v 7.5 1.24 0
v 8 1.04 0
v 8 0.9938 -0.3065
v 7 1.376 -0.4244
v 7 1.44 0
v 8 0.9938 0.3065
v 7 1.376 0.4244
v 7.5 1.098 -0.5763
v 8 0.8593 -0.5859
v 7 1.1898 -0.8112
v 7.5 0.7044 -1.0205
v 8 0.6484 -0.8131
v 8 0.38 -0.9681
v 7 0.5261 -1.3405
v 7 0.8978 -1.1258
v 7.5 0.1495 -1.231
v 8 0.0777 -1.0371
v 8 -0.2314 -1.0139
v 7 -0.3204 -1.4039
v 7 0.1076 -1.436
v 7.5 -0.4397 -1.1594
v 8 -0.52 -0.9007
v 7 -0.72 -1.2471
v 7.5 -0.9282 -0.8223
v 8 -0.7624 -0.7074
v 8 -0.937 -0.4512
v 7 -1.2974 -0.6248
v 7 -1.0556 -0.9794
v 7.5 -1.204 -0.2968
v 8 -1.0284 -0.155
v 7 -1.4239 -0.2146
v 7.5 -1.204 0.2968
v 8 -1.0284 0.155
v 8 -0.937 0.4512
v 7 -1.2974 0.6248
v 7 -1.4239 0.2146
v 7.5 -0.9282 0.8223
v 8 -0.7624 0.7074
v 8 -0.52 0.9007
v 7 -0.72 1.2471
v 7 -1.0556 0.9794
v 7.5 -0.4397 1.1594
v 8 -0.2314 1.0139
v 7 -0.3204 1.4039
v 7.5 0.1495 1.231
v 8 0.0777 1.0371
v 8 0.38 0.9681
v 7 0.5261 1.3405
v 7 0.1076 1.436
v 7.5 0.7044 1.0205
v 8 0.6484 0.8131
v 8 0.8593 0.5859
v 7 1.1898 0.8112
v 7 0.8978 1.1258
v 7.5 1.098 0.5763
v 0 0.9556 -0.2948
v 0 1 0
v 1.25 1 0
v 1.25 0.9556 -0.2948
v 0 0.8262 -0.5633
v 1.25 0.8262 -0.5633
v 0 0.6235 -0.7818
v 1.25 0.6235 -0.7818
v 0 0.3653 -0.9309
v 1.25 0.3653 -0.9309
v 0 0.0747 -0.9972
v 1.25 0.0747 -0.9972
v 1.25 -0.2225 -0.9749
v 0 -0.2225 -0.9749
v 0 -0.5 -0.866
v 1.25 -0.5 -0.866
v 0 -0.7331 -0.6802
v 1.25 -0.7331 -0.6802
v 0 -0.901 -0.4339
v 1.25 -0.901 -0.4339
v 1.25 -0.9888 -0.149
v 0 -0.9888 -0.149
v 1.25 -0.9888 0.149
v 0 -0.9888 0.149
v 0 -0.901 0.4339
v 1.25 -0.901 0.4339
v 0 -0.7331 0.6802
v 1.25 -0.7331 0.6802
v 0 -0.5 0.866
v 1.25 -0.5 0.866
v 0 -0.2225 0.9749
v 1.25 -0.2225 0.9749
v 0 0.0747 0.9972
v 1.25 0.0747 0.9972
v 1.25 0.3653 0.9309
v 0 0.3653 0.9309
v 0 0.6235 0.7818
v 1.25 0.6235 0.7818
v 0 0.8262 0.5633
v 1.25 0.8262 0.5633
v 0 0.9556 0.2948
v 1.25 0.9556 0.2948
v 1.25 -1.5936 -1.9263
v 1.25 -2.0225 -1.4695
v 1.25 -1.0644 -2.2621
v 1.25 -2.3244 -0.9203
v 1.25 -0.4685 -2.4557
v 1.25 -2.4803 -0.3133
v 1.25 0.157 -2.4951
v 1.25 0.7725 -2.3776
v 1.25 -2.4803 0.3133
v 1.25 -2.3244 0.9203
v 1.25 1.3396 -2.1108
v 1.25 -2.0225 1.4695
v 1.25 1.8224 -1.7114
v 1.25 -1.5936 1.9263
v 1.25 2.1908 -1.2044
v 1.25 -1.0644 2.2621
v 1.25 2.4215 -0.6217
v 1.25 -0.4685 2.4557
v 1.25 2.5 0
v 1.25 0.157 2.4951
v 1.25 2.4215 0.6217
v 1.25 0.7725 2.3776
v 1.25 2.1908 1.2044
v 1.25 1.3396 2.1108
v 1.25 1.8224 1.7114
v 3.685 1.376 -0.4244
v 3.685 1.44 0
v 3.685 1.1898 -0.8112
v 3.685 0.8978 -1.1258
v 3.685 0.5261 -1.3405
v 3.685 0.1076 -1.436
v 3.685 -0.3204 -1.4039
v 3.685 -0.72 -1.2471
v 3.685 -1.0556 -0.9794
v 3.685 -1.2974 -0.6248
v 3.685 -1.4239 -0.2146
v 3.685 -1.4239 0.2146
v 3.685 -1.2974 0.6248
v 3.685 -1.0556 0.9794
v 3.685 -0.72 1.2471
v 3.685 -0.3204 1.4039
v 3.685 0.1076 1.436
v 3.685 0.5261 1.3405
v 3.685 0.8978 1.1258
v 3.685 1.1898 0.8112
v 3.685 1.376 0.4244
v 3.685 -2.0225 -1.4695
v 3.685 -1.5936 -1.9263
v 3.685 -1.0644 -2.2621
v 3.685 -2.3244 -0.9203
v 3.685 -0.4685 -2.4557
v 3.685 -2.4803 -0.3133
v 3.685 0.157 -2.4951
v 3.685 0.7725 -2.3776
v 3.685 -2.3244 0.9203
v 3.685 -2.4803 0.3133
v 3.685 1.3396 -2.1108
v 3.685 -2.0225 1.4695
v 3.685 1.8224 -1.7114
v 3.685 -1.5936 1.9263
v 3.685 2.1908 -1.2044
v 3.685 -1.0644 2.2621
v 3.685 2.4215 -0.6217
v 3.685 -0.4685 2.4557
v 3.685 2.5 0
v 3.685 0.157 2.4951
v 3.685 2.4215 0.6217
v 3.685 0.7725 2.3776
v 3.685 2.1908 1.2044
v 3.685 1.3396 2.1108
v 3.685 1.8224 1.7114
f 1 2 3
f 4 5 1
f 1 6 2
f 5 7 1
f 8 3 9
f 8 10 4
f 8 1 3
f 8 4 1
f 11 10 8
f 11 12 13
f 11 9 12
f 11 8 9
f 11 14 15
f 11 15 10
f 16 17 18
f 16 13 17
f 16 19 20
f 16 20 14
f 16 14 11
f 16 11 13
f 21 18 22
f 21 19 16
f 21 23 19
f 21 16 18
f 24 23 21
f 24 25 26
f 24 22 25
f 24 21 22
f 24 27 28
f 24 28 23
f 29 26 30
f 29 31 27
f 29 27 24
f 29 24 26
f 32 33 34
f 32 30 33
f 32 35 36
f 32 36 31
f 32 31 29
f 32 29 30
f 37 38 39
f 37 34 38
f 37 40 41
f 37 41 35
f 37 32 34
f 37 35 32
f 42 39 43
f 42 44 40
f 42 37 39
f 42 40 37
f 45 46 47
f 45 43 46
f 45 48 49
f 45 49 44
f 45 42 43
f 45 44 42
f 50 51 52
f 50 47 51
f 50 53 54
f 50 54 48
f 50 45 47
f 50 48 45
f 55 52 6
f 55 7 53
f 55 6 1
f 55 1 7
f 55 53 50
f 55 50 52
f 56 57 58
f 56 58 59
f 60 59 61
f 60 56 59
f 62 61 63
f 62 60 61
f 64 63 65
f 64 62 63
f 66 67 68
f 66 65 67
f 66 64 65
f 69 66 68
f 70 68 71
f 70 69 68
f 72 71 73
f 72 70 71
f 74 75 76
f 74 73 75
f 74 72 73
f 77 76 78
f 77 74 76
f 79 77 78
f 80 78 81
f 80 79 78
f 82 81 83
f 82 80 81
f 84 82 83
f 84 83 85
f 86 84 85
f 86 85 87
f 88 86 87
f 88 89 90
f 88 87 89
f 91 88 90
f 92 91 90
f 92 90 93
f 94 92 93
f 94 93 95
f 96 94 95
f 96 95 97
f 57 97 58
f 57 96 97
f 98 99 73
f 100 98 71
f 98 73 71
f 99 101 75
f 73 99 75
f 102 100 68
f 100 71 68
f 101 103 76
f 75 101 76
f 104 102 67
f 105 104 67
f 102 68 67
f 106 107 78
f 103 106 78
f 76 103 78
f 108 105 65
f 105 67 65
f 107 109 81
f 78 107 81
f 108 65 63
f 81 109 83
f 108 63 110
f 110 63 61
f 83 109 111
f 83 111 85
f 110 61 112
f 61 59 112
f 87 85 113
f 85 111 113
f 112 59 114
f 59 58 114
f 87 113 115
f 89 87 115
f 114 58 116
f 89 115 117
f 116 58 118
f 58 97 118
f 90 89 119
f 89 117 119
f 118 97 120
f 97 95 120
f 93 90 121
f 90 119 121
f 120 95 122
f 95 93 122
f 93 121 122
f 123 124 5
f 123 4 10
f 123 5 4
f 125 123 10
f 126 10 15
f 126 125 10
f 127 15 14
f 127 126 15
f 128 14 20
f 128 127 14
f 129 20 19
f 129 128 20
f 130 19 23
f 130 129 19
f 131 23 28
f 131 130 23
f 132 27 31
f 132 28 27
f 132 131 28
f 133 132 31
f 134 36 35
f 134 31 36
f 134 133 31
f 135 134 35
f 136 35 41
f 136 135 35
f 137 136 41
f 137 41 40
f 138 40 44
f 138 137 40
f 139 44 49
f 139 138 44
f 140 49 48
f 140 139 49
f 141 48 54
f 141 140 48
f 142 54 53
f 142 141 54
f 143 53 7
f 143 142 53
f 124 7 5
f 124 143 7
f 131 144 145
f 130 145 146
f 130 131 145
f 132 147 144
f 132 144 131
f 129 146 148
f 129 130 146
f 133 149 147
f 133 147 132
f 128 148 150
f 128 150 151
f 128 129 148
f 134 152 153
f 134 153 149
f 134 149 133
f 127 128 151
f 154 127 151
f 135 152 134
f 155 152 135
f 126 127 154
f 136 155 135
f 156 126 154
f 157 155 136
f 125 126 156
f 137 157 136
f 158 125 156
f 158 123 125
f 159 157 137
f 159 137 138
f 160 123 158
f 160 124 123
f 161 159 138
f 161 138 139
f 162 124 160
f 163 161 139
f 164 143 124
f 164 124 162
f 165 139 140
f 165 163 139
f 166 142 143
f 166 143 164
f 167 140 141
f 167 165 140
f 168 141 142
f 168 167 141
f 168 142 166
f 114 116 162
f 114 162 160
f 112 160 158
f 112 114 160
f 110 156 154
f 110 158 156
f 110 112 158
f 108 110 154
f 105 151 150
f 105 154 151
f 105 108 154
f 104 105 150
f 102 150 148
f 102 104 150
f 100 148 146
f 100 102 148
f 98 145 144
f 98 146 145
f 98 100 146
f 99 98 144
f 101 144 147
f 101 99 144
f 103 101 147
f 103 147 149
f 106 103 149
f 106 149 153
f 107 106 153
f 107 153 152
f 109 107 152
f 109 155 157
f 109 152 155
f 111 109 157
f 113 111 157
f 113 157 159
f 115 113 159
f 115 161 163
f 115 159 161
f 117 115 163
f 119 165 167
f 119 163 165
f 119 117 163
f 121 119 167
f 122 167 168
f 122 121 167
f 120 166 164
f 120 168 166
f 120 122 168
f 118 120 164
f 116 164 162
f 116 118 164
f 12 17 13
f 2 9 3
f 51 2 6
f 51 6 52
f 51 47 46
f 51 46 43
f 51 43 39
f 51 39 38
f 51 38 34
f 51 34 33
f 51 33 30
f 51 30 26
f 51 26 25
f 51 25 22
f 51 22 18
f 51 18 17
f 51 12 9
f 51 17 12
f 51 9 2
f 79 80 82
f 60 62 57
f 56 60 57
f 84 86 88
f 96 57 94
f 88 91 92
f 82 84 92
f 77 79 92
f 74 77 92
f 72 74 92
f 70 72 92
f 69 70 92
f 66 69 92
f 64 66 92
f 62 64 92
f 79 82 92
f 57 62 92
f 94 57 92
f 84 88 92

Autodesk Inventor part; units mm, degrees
ref_plane "YZ Plane" through (0, 0, 0) normal (1, 0, 0) x (0, 1, 0)
ref_plane "XZ Plane" through (0, 0, 0) normal (0, 1, 0) x (-1, 0, 0)
ref_plane "XY Plane" through (0, 0, 0) normal (0, 0, 1) x (1, 0, 0)
sketch "Sketch1" plane through (0, 0, 0) normal (0, 0, 1) x (1, 0, 0)
  line L0 (0, 0) -> (1.25, 0)
  line L1 (1.25, 0) -> (1.25, 1)
  line L2 (1.25, 1) -> (0, 1)
  line L3 (0, 1) -> (0, 0)
  line L4 (1.25, 0) -> (3.685, 0)
  line L5 (3.685, 0) -> (3.685, 2.5)
  line L6 (3.685, 2.5) -> (1.25, 2.5)
  line L7 (1.25, 2.5) -> (1.25, 0)
  line L8 (3.685, 0) -> (8, 0)
  line L9 (8, 0) -> (8, 1.44)
  line L10 (8, 1.44) -> (3.685, 1.44)
  line L11 (3.685, 1.44) -> (3.685, 0)
  dimension "d0" = 1.25
  dimension "d1" = 3.685
  dimension "d2" = 8
  dimension "d3" = 2
  dimension "d4" = 5
  dimension "d5" = 2.88
revolve "Revolution1" add sketch "Sketch1" angle 360 about axis through (3.685, 0, 0) along (1, 0, 0)
chamfer "Chamfer1" distance 0.4 distance2 1 1 edges at (8, -1.44, 0) measured on face at (8, -0.2568, -0.5255)
properties part number "403-04" material "Brass, Soft Yellow"
